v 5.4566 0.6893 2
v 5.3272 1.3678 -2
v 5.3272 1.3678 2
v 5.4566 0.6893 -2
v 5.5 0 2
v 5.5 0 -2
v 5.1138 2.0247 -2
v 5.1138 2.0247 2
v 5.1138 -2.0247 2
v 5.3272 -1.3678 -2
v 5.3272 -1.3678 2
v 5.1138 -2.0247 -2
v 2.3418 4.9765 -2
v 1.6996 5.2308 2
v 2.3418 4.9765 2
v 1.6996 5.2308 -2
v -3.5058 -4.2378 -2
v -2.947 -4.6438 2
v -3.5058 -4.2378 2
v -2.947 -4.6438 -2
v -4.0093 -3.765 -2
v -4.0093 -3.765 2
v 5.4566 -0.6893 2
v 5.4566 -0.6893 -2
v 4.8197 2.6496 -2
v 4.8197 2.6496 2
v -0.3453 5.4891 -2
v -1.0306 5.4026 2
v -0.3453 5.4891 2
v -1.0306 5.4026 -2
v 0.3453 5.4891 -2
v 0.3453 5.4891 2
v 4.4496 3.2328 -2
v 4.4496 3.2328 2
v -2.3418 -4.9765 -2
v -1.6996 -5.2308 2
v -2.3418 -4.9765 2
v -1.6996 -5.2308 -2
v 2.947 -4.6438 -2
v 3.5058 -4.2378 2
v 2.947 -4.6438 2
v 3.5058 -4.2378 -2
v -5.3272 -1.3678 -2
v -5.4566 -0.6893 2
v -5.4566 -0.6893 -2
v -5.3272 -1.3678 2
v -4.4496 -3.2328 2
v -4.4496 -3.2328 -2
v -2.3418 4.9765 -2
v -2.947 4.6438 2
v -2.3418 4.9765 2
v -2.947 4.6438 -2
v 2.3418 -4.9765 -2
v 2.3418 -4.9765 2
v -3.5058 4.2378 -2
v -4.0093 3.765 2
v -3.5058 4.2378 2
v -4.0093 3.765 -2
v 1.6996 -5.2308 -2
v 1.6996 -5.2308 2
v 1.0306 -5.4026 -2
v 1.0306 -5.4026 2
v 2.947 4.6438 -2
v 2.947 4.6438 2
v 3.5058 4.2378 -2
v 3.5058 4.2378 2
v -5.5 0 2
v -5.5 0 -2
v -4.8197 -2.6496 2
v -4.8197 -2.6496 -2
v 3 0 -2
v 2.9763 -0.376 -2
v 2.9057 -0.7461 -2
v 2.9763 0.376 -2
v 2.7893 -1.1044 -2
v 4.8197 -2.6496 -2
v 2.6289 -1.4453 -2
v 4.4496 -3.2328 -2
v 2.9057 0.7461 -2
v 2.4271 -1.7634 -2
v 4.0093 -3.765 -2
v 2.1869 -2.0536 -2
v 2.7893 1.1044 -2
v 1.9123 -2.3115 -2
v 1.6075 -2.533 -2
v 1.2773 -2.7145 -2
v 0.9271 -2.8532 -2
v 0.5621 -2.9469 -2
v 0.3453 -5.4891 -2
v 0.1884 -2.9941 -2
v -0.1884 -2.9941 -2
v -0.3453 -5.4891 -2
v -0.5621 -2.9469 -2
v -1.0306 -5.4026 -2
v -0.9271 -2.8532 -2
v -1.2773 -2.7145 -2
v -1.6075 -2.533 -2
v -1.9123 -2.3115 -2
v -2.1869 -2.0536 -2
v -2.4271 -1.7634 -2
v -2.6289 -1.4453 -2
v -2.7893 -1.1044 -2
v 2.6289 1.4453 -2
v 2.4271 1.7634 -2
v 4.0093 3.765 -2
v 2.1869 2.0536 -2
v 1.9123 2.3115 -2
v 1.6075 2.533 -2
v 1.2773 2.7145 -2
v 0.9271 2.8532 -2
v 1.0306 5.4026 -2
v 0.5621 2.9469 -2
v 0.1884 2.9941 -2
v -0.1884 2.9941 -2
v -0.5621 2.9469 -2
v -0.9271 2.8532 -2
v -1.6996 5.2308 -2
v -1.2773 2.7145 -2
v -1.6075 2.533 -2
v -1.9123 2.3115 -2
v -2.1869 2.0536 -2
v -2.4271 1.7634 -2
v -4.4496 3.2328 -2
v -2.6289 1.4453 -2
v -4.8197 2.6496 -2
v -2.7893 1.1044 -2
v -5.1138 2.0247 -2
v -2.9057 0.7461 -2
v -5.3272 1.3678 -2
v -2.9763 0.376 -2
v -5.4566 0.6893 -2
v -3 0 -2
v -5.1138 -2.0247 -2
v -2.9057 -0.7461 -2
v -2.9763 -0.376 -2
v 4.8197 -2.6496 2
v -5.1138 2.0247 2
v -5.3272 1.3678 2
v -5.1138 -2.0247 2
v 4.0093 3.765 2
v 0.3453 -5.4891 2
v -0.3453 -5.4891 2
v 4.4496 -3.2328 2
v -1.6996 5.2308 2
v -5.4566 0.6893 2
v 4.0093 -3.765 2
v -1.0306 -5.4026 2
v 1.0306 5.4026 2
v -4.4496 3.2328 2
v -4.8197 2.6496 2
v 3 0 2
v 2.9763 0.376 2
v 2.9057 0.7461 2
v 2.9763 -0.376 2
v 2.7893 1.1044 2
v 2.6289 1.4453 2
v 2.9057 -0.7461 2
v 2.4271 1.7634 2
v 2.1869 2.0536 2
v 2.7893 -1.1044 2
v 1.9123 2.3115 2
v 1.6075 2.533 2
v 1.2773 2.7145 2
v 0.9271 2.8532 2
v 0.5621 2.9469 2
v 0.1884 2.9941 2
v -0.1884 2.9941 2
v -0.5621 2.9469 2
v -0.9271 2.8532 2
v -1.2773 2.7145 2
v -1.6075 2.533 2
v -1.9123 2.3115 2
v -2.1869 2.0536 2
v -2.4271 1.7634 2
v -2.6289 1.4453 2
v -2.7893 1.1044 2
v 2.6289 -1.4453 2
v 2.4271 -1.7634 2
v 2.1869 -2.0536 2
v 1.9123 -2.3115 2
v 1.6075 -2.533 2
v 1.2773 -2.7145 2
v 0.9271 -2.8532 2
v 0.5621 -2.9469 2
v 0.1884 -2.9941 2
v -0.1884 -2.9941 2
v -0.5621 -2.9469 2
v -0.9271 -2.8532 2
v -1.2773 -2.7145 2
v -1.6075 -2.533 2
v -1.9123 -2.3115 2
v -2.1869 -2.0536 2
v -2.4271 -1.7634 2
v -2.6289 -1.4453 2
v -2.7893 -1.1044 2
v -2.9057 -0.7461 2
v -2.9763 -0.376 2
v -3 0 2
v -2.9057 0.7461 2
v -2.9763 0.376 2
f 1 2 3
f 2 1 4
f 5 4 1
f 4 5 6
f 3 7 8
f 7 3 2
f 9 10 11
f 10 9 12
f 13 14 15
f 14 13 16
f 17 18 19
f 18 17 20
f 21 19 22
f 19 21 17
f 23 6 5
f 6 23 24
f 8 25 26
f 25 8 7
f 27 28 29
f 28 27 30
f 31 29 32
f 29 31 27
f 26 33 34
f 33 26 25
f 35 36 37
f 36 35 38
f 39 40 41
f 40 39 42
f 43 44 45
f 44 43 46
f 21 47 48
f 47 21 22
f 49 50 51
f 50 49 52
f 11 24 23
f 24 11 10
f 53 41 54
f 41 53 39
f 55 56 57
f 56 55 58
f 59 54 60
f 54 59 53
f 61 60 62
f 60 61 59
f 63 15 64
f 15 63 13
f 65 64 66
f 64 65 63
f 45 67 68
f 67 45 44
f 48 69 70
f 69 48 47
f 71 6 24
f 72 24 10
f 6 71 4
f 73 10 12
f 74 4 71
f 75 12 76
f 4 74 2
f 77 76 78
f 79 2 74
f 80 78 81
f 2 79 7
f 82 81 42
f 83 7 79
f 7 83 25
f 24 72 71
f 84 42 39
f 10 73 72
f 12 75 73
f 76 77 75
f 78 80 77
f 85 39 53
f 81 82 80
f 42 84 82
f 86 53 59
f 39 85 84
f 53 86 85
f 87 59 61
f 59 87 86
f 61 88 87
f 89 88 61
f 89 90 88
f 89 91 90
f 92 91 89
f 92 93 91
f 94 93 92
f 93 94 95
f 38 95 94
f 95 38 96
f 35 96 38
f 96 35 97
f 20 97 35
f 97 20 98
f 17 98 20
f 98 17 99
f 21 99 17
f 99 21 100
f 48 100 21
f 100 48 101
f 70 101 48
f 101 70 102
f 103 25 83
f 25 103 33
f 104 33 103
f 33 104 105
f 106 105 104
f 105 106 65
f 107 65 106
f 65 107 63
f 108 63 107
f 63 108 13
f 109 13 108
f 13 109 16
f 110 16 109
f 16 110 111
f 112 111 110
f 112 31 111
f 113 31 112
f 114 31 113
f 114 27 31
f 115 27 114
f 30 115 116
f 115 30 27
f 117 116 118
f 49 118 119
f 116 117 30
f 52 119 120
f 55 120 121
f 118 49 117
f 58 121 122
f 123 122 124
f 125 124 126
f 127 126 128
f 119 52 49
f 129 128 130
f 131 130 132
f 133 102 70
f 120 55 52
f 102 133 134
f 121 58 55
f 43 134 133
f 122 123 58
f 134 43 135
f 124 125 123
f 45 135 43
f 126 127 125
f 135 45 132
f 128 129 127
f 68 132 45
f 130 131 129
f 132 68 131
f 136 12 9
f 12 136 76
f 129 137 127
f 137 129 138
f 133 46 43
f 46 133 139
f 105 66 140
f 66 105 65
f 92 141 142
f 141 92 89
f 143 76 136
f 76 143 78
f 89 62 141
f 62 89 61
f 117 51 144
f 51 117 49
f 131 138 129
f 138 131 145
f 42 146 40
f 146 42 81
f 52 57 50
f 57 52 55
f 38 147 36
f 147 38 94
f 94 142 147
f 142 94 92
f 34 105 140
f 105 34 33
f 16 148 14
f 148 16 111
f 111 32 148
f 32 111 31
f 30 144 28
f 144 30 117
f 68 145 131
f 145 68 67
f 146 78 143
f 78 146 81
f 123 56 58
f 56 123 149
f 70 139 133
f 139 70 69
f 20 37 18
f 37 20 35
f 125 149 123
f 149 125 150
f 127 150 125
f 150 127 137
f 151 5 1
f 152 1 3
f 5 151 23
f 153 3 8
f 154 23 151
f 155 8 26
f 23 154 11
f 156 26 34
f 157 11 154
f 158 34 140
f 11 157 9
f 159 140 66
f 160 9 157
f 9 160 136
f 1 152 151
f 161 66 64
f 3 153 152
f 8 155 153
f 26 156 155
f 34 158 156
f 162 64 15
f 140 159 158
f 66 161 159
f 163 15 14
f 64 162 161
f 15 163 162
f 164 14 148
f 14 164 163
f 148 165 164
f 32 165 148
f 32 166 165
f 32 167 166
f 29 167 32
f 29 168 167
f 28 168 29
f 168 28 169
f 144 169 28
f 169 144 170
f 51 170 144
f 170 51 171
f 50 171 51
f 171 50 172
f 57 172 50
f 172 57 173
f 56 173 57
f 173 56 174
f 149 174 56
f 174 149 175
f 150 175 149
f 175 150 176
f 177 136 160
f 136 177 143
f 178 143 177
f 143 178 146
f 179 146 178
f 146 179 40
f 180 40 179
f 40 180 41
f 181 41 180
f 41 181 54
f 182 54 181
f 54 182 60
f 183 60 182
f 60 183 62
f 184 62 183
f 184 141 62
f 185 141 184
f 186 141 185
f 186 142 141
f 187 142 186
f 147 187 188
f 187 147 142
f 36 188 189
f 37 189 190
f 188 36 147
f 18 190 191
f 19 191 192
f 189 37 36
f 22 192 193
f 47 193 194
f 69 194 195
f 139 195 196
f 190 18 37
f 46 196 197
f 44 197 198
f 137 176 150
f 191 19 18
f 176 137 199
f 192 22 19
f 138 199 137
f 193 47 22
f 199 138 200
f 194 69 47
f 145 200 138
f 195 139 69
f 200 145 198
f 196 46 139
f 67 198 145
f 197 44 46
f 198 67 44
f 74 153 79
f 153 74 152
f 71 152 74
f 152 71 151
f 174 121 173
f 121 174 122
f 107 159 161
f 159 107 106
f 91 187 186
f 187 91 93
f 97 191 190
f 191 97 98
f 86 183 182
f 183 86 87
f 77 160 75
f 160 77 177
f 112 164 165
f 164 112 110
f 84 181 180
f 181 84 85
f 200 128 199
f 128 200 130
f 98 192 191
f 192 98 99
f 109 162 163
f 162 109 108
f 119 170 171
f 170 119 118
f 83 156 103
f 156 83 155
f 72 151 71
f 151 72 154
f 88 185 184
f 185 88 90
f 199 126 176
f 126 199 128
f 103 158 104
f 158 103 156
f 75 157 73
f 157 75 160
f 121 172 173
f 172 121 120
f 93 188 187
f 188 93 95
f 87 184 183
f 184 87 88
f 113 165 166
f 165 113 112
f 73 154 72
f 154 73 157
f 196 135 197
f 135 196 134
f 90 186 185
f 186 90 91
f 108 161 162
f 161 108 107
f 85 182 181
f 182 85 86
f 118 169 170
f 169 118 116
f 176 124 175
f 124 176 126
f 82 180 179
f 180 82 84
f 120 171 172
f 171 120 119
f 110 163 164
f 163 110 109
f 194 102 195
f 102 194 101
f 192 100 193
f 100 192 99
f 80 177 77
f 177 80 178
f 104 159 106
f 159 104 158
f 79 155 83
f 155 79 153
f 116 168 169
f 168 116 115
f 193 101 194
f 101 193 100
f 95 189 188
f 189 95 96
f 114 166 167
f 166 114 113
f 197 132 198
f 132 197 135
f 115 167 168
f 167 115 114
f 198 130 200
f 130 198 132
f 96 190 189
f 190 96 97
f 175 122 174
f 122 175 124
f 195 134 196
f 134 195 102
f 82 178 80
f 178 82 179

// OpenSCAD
$fn = 50;


difference() {
	union() {
		translate(v = [0, 0, -2.0000000000]) {
			cylinder(h = 4, r = 5.5000000000);
		}
	}
	union() {
		translate(v = [0, 0, -100.0000000000]) {
			cylinder(h = 200, r = 3.0000000000);
		}
	}
}
